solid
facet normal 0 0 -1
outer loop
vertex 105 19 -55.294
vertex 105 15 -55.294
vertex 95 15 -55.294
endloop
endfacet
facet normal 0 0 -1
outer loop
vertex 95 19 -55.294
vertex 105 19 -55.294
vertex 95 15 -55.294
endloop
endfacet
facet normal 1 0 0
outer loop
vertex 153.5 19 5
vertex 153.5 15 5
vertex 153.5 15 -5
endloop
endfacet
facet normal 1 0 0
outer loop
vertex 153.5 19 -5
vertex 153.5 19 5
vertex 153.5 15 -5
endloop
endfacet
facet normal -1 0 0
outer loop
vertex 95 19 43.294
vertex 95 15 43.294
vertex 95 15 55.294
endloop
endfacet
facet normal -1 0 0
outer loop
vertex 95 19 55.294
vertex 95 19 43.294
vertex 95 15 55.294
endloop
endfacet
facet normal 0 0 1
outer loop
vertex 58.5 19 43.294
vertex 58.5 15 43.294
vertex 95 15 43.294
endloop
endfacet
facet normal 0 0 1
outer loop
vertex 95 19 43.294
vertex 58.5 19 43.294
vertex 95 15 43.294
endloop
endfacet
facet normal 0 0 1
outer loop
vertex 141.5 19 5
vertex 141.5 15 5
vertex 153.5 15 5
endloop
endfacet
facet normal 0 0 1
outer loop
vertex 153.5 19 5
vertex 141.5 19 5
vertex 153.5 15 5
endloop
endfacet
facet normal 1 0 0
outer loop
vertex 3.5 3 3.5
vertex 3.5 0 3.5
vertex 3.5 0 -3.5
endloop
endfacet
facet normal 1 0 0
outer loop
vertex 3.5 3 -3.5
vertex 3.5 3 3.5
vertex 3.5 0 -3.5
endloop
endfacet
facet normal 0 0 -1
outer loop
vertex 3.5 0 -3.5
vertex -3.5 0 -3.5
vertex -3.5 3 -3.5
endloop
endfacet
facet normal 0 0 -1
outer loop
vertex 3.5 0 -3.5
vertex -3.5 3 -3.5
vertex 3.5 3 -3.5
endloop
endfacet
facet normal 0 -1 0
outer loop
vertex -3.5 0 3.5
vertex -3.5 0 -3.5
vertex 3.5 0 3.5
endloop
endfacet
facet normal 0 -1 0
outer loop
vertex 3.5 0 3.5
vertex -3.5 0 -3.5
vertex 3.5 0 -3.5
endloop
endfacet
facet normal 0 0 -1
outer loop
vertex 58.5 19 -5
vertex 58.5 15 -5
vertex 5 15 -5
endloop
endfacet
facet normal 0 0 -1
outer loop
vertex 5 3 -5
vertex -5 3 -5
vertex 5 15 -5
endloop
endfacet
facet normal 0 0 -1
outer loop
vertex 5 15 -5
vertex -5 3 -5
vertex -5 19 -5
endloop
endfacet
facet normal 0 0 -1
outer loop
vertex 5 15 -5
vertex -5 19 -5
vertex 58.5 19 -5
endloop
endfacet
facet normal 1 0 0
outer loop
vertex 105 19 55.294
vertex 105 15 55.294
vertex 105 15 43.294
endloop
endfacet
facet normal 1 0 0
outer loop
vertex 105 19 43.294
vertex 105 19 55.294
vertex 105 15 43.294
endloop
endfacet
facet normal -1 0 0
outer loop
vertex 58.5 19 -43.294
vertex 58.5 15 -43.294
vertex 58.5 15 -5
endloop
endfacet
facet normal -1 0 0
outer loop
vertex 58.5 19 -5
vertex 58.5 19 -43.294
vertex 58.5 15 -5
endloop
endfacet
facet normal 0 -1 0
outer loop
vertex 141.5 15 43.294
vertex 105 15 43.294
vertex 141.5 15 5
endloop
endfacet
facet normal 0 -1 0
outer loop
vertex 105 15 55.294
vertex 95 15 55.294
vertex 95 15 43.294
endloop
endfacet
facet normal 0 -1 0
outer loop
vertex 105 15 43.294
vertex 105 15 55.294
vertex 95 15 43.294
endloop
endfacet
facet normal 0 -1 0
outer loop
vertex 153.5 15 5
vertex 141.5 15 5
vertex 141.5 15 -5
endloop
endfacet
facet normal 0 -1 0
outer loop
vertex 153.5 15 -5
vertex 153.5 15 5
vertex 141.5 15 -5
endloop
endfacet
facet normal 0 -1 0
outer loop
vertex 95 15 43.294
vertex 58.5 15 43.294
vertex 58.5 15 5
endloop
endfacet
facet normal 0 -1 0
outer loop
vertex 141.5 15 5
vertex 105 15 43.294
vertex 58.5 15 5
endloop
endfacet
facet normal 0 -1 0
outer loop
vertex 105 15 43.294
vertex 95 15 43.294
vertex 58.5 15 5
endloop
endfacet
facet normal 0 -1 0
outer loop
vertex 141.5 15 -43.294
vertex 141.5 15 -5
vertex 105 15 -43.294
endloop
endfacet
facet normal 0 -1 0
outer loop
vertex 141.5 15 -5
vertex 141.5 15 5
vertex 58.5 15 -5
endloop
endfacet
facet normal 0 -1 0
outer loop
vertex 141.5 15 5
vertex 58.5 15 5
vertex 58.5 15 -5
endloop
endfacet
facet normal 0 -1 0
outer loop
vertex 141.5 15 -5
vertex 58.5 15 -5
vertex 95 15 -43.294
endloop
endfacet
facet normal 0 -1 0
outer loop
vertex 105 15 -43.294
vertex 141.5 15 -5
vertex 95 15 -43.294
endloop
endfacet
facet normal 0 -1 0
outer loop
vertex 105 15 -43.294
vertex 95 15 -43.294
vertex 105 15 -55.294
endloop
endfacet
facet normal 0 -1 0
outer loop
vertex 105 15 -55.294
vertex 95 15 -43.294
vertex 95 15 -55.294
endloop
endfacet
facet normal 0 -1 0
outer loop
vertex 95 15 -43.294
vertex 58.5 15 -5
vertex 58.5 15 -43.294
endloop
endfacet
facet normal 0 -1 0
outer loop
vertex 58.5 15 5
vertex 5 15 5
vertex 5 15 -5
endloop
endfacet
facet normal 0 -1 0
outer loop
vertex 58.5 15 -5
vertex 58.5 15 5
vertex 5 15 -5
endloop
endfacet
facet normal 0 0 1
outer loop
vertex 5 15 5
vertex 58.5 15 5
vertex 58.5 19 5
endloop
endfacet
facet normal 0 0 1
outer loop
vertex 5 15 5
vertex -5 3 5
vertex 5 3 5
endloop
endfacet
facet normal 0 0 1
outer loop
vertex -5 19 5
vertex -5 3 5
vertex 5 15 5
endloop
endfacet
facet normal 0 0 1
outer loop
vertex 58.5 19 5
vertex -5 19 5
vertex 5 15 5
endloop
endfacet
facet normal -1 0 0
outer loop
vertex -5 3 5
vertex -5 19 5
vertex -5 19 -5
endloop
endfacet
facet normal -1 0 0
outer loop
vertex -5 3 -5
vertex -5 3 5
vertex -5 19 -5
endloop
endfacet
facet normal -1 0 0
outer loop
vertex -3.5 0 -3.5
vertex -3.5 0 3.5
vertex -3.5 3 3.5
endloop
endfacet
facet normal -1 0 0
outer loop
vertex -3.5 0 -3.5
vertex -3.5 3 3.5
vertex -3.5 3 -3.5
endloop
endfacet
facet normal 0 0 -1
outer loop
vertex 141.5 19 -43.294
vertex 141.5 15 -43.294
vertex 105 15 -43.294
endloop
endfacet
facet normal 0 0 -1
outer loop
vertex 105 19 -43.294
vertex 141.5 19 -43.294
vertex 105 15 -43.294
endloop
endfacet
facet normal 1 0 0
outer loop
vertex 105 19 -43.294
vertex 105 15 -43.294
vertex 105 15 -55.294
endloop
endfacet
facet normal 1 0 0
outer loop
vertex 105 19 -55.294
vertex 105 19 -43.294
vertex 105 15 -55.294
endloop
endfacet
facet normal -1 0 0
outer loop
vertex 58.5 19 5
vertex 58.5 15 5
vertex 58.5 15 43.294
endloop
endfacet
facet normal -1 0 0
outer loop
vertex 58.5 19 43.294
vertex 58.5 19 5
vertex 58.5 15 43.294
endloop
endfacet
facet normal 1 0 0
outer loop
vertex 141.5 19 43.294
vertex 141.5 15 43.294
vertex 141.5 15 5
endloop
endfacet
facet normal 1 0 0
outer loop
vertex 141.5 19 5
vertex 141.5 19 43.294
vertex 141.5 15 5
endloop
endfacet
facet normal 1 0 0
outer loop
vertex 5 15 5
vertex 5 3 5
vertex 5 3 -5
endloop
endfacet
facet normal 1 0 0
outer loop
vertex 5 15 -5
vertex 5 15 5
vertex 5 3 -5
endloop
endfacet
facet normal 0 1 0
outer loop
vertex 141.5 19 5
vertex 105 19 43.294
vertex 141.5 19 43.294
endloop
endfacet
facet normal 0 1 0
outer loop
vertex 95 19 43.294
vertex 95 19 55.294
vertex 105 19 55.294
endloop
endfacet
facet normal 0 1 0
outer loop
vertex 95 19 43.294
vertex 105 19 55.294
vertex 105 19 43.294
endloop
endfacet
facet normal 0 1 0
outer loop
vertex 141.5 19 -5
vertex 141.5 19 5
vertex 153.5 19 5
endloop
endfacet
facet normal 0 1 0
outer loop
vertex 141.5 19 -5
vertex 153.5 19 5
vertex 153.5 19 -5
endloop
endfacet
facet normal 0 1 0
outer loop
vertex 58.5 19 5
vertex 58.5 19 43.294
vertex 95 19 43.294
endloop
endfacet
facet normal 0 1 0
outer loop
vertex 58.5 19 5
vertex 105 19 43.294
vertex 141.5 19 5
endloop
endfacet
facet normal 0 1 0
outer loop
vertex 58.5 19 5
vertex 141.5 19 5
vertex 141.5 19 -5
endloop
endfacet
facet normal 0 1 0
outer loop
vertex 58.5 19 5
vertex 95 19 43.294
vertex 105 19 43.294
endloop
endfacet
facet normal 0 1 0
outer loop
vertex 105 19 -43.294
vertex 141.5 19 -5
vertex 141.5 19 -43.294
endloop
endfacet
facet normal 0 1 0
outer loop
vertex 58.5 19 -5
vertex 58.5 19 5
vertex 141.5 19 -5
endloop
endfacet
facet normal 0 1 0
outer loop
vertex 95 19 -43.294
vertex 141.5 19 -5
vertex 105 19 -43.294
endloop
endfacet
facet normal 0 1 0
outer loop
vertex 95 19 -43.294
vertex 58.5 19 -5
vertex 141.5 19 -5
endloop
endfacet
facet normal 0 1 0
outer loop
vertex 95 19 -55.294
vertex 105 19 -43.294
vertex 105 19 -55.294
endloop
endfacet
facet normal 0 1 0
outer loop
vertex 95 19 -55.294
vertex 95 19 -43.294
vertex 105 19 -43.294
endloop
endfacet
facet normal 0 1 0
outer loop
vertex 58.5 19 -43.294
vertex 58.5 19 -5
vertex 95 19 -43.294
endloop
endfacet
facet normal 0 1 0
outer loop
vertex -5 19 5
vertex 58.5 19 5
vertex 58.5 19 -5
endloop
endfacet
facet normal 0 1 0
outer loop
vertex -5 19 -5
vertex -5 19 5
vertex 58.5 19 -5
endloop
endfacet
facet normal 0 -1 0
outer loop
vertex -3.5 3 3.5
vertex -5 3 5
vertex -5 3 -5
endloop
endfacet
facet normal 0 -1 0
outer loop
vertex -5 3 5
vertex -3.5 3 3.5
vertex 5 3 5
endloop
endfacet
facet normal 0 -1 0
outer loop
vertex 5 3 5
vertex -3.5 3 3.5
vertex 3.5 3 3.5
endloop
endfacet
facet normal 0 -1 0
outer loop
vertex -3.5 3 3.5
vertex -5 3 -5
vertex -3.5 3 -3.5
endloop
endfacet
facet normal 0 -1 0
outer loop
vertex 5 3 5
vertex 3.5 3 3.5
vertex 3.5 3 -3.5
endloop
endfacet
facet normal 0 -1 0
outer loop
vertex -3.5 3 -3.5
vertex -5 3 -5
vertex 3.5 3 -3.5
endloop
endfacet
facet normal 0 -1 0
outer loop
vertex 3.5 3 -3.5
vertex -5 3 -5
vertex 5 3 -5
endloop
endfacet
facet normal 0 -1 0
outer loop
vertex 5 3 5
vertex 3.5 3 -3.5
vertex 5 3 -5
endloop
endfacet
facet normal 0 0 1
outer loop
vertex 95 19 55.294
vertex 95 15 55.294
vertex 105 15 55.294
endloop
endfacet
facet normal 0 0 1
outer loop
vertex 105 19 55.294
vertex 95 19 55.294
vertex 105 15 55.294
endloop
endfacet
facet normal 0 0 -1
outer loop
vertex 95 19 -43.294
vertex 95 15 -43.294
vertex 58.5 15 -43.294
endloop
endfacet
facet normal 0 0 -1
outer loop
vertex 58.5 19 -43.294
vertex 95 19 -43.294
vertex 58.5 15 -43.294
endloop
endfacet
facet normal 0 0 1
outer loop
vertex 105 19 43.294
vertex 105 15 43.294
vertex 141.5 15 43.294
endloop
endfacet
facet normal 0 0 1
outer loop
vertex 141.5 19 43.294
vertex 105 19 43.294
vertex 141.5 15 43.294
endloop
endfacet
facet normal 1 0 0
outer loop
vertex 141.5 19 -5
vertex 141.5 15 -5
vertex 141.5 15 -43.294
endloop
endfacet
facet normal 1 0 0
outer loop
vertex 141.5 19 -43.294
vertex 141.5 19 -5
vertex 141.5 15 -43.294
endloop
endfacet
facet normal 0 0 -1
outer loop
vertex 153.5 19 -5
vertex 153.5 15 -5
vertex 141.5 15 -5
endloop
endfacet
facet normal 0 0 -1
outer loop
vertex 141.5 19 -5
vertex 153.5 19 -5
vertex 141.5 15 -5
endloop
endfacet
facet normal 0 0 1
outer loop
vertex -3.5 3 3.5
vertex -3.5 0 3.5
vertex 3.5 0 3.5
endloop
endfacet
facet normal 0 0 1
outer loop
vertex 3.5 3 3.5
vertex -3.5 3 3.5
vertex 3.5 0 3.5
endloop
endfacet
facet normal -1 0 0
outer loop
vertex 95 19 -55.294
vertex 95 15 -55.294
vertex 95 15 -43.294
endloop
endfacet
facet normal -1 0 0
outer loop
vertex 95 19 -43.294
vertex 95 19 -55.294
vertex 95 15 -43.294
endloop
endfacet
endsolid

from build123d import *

# Parameters (mm, degrees)
SKETCH1_W           = 7
SKETCH1_H           = 7
BOSS_EXTRUDE1_DEPTH = 3
SKETCH3_W           = 10
SKETCH3_H           = 10
BOSS_EXTRUDE2_DEPTH = 12
BOSS_EXTRUDE4_DEPTH = 4
SKETCH7_W           = 10
SKETCH7_H           = 10
BOSS_EXTRUDE6_DEPTH = 4
SKETCH8_W           = 10
SKETCH8_H           = 4
BOSS_EXTRUDE7_DEPTH = 53.5


with BuildPart() as part:
    # Sketch1 → Boss-Extrude1 (new body)
    with BuildSketch(Plane(origin=(0, 0, 0), x_dir=(1, 0, 0), z_dir=(0, 1, 0))):
        Rectangle(SKETCH1_W, SKETCH1_H)
    extrude(amount=BOSS_EXTRUDE1_DEPTH)

    # Sketch3 → Boss-Extrude2 (add)
    with BuildSketch(Plane(origin=(0, 3, 0), x_dir=(1, 0, 0), z_dir=(0, 1, 0))):
        Rectangle(SKETCH3_W, SKETCH3_H)
    extrude(amount=BOSS_EXTRUDE2_DEPTH)

    # Sketch7 → Boss-Extrude6 (add)
    with BuildSketch(Plane(origin=(0, 15, 0), x_dir=(1, 0, 0), z_dir=(0, 1, 0))):
        Rectangle(SKETCH7_W, SKETCH7_H)
    extrude(amount=BOSS_EXTRUDE6_DEPTH)



with BuildPart() as body_2:
    # Sketch4 → Boss-Extrude4 (new body)
    with BuildSketch(Plane(origin=(0, 15, 0), x_dir=(1, 0, 0), z_dir=(0, 1, 0))):
        Polygon((105, 43.294473551), (105, 55.294473551), (95, 55.294473551), (95, 43.294473551), (58.5, 43.294473551), (58.5, -43.294473551), (95, -43.294473551), (95, -55.294473551), (105, -55.294473551), (105, -43.294473551), (141.5, -43.294473551), (141.5, -5), (153.5, -5), (153.5, 5), (141.5, 5), (141.5, 43.294473551), align=None)
    extrude(amount=BOSS_EXTRUDE4_DEPTH)


with BuildPart() as part_1:
    add(part.part)

    add(body_2.part)  # Boss-Extrude7 merges body 2
    # Sketch8 → Boss-Extrude7 (add)
    with BuildSketch(Plane(origin=(5, 0, 0), x_dir=(0, 0, -1), z_dir=(1, 0, 0))):
        with Locations((0, 17)):
            Rectangle(SKETCH8_W, SKETCH8_H)
    extrude(amount=BOSS_EXTRUDE7_DEPTH)


solid = part_1.part
